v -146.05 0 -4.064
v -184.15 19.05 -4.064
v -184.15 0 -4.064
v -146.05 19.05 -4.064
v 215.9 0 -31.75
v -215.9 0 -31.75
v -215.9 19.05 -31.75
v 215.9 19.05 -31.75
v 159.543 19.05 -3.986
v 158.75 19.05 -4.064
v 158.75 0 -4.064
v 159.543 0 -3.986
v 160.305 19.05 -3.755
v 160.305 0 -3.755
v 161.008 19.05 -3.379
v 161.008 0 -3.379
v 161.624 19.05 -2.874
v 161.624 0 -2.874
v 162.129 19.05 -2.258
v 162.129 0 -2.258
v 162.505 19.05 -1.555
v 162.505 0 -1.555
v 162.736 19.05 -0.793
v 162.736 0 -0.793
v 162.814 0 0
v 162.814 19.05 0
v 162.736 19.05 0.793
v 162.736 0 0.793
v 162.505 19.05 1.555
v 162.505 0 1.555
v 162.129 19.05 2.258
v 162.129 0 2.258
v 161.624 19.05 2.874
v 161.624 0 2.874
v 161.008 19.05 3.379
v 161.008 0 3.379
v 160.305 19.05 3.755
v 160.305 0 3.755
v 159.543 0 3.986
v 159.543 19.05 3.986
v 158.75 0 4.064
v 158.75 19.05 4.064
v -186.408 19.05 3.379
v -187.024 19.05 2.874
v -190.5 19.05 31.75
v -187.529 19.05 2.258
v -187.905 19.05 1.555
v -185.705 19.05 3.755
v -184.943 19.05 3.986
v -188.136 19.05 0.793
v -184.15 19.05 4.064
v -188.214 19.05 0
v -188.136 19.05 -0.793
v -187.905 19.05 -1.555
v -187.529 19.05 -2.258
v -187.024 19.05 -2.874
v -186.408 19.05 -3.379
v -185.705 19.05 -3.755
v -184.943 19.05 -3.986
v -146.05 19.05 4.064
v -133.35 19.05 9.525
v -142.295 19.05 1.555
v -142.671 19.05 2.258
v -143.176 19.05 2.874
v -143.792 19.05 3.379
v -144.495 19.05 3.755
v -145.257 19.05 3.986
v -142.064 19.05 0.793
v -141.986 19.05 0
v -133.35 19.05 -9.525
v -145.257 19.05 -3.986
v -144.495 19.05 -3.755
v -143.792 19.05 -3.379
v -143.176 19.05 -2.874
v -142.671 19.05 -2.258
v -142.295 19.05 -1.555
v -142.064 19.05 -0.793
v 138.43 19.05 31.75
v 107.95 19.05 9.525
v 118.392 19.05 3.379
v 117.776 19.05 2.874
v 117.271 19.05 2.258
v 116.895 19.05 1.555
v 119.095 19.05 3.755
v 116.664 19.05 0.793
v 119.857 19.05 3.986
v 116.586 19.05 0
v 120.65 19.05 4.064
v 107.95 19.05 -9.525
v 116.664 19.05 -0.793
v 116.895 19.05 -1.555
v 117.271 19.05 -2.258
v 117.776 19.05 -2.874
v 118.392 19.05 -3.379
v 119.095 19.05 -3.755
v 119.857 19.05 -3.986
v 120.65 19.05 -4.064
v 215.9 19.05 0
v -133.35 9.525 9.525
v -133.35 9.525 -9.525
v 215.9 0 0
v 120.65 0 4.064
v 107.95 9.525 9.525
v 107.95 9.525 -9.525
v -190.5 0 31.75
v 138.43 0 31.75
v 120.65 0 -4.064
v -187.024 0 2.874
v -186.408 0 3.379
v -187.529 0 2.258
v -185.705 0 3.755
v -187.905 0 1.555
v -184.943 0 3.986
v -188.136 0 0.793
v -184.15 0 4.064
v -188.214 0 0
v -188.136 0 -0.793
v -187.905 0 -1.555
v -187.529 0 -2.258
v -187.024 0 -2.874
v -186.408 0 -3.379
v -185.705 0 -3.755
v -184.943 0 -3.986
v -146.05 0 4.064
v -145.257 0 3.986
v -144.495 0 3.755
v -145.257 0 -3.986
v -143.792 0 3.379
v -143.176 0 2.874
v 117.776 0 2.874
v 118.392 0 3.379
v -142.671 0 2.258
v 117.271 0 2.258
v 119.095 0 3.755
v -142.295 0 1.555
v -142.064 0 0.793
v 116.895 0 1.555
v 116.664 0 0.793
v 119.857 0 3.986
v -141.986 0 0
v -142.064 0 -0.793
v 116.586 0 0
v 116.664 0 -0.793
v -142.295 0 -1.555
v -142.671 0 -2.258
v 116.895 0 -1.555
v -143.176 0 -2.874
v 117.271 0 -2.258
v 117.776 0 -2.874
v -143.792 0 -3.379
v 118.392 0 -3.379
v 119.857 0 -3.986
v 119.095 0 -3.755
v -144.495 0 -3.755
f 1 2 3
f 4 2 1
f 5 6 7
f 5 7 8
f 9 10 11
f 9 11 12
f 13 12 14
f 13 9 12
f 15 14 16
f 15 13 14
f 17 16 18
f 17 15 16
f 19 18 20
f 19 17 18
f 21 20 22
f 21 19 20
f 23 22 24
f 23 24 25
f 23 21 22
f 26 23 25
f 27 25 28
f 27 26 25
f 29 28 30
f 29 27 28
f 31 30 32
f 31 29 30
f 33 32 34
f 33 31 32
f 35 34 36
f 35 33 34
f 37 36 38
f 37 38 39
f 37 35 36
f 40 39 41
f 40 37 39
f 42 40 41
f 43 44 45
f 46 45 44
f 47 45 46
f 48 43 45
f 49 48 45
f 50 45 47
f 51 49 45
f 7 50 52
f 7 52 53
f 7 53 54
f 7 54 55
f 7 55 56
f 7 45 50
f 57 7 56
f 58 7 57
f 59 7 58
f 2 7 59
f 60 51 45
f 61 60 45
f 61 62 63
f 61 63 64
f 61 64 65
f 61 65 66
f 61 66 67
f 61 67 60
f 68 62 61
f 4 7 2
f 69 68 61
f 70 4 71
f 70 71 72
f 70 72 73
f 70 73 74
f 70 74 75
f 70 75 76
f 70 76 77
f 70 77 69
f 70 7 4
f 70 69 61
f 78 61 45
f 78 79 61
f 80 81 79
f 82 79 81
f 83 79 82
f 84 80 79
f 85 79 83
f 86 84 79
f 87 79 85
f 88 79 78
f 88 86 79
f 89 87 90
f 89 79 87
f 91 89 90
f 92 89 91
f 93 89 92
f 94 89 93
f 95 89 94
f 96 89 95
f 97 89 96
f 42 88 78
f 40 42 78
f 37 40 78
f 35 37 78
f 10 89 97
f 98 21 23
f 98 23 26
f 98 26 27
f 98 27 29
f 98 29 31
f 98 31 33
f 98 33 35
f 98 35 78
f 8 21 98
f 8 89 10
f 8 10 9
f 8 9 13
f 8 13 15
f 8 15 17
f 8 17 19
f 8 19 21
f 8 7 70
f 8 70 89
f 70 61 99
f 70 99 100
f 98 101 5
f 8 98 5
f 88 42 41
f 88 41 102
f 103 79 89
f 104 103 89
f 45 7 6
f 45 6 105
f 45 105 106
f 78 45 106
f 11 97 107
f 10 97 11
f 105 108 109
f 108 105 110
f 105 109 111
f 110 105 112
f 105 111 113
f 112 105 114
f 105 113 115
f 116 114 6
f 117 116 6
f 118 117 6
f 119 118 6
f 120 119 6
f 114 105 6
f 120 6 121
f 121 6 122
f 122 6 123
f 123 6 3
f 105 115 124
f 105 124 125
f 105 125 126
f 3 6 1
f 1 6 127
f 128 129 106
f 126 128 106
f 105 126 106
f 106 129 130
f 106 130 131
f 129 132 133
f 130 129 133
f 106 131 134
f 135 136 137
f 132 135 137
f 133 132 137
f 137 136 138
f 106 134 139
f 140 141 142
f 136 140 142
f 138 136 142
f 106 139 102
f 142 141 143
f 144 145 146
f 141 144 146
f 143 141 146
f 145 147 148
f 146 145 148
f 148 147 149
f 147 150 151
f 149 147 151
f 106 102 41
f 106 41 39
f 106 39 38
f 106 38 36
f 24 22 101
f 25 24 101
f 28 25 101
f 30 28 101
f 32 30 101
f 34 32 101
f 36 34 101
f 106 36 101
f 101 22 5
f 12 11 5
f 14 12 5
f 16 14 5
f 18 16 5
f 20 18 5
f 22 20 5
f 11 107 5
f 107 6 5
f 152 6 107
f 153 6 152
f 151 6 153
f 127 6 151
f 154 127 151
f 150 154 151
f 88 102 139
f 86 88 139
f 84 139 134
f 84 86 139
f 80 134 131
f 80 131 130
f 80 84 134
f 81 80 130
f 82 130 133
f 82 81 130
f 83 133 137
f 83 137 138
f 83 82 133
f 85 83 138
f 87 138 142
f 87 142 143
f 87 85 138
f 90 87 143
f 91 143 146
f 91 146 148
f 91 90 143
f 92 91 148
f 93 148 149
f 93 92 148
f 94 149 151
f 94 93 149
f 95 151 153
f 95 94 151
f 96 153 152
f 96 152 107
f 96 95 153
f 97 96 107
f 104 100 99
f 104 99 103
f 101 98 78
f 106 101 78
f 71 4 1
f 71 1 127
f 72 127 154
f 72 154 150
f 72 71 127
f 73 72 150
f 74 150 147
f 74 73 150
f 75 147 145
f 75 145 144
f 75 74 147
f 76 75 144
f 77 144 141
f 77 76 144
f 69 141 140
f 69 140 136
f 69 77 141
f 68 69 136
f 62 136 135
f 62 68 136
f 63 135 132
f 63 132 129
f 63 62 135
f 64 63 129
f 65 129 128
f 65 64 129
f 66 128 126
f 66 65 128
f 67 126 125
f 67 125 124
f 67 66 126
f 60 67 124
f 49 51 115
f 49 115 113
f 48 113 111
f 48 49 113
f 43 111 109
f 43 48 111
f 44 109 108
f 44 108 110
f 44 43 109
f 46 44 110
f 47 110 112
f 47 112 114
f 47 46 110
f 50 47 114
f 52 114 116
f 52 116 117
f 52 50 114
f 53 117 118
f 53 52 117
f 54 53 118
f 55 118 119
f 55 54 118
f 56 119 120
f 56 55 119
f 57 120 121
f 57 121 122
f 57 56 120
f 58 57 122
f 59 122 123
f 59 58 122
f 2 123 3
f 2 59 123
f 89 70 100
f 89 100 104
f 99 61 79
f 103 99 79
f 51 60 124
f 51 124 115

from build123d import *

# Parameters (mm, degrees)
SKETCH1_W           = 431.8
SKETCH1_H           = 63.5
BOSS_EXTRUDE1_DEPTH = 19.05
CUT_EXTRUDE2_DEPTH  = 220.051991545
CUT_EXTRUDE1_DEPTH  = 19.05
SKETCH5_W           = 241.3
SKETCH5_H           = 19.05
CUT_EXTRUDE3_DEPTH  = 9.525


with BuildPart() as part:
    # Sketch1 → Boss-Extrude1 (new body)
    with BuildSketch(Plane(origin=(0, 0, 0), x_dir=(1, 0, 0), z_dir=(0, 1, 0))):
        Rectangle(SKETCH1_W, SKETCH1_H)
    extrude(amount=BOSS_EXTRUDE1_DEPTH)

    # Sketch3 → Cut-Extrude2 (cut, through all)
    with BuildSketch(Plane(origin=(0, 19.05, 0), x_dir=(1, 0, 0), z_dir=(0, 1, 0))):
        Polygon((-215.9, 31.75), (-190.5, -31.75), (-215.9, -31.75), align=None)
        Polygon((215.9, 0), (138.43, -31.75), (215.9, -31.75), align=None)
    extrude(amount=-CUT_EXTRUDE2_DEPTH, mode=Mode.SUBTRACT)

    # Sketch2 → Cut-Extrude1 (cut)
    with BuildSketch(Plane(origin=(0, 19.05, 0), x_dir=(1, 0, 0), z_dir=(0, 1, 0))):
        with BuildLine():
            Line((158.75, -4.064), (120.65, -4.064))
            ThreePointArc((120.65, -4.064), (116.586, 0), (120.65, 4.064))
            Line((120.65, 4.064), (158.75, 4.064))
            ThreePointArc((158.75, 4.064), (162.814, 0), (158.75, -4.064))
        make_face()
        with BuildLine():
            Line((-184.15, 4.064), (-146.05, 4.064))
            ThreePointArc((-146.05, 4.064), (-141.986, 0), (-146.05, -4.064))
            Line((-146.05, -4.064), (-184.15, -4.064))
            ThreePointArc((-184.15, -4.064), (-188.214, 0), (-184.15, 4.064))
        make_face()
    extrude(amount=-CUT_EXTRUDE1_DEPTH, mode=Mode.SUBTRACT)

    # Sketch5 → Cut-Extrude3 (cut)
    with BuildSketch(Plane(origin=(0, 19.05, 0), x_dir=(1, 0, 0), z_dir=(0, 1, 0))):
        with Locations((-12.7, 0)):
            Rectangle(SKETCH5_W, SKETCH5_H)
    extrude(amount=-CUT_EXTRUDE3_DEPTH, mode=Mode.SUBTRACT)


solid = part.part
